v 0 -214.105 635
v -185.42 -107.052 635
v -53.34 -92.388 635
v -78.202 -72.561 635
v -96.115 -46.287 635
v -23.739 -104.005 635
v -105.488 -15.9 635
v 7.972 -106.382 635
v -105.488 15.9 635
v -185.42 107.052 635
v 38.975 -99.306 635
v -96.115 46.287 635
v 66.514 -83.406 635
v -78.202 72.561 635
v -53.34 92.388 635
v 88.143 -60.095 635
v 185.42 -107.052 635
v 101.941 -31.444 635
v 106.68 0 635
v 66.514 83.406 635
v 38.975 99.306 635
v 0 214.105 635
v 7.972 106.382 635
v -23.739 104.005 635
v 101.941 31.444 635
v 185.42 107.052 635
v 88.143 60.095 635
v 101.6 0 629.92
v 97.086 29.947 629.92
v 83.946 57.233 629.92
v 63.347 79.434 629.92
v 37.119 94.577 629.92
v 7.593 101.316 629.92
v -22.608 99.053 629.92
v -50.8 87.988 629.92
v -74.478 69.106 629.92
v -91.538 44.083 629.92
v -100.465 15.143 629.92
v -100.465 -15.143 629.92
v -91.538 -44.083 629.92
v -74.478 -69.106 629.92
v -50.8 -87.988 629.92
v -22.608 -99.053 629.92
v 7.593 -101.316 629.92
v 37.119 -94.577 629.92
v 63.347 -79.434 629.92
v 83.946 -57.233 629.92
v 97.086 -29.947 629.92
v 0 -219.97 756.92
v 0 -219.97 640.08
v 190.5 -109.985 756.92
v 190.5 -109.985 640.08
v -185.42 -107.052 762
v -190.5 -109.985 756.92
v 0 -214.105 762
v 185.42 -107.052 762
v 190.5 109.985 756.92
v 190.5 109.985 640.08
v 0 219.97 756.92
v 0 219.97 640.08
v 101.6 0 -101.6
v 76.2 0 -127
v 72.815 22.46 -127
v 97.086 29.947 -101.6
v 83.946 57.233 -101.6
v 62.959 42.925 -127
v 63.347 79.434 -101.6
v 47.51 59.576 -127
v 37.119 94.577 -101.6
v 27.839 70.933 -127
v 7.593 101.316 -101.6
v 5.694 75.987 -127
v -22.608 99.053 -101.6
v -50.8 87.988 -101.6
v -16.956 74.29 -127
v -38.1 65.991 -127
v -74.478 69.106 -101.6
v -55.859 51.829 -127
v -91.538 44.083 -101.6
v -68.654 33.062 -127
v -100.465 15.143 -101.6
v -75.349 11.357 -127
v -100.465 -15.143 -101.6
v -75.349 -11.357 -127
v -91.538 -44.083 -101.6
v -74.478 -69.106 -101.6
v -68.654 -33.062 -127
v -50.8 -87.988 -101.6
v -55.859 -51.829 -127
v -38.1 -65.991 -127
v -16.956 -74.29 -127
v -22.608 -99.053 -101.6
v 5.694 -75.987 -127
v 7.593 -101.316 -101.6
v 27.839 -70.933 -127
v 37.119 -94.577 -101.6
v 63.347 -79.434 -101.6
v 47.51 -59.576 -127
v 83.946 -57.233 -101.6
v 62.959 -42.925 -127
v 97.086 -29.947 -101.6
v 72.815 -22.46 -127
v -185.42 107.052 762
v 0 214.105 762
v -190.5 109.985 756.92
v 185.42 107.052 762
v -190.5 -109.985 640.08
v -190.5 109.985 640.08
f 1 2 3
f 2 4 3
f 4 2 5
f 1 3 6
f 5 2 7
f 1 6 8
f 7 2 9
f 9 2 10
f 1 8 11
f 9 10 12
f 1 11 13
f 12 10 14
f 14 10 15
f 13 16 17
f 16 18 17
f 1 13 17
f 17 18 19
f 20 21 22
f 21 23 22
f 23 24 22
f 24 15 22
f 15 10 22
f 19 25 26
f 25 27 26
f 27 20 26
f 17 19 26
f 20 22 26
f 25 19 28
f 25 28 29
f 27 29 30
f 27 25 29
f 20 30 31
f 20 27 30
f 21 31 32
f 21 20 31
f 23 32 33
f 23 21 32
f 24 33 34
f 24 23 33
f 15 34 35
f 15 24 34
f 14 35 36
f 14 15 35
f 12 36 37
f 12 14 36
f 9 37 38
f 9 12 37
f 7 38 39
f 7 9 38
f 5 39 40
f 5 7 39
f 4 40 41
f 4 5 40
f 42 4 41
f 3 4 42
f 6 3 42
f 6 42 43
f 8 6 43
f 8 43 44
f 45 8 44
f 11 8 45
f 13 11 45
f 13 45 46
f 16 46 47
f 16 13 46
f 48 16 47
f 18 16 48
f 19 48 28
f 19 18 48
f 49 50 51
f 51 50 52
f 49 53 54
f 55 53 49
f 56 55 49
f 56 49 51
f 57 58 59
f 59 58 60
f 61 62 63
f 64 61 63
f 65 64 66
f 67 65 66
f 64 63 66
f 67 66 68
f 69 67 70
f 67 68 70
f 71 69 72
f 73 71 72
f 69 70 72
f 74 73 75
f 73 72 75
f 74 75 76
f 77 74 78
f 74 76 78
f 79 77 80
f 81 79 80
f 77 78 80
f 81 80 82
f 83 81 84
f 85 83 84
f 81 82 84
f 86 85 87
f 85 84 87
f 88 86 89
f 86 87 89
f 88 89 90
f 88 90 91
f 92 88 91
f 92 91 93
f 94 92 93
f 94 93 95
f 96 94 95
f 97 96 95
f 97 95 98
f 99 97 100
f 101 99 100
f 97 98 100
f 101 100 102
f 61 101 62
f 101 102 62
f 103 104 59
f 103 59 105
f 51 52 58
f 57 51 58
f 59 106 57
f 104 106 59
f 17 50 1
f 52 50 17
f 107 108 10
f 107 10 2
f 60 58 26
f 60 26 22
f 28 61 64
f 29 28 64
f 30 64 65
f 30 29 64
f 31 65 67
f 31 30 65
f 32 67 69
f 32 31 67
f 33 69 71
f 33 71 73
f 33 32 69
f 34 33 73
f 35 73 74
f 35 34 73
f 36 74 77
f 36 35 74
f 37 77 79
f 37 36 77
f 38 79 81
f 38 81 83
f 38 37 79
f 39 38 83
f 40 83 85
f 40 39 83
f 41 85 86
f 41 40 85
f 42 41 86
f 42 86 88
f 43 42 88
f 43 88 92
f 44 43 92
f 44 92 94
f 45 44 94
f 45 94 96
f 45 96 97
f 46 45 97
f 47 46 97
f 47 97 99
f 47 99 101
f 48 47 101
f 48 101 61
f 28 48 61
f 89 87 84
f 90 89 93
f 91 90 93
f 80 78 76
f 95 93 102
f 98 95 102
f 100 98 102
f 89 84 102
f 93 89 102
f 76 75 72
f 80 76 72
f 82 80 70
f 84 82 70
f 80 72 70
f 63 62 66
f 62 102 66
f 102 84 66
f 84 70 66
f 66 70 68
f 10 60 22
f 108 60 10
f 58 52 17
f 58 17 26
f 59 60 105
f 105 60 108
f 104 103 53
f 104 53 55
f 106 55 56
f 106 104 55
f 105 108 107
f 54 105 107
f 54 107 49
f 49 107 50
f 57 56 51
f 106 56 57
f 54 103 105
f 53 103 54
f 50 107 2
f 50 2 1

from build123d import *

# Parameters (mm, degrees)
F0_R     = 101.6
F1_DEPTH = 635
F2_R     = 101.6
F3_DEPTH = 127
F4_DEPTH = 127
F5_SIZE  = 25.4
F6_SIZE  = 5.08


with BuildPart() as f1:
    # F0 (on Top) → F1 (new body)
    with BuildSketch(Plane.XY):
        Circle(F0_R)
    extrude(amount=F1_DEPTH)

    # F2 (on face) → F3 (join)
    with BuildSketch(Plane.XY.offset(635)):
        Polygon((-190.5, 109.9852262806), (-190.5, -109.9852262806), (0, -219.9704525612), (190.5, -109.9852262806), (190.5, 109.9852262806), (0, 219.9704525612), align=None)
        Circle(F2_R, mode=Mode.SUBTRACT)
        Circle(F2_R)
    extrude(amount=F3_DEPTH)

    # F4 (add): a face of the model
    f4_faces = [f1.faces().sort_by_distance(p)[0] for p in [
        (0, 0, 0),
    ]]
    extrude(f4_faces, amount=F4_DEPTH)

    # F5
    f5_edges = [f1.edges().sort_by_distance(p)[0] for p in [
        (-101.6, 0, -127),
    ]]
    chamfer(f5_edges, length=F5_SIZE)

    # F6
    f6_edges = [f1.edges().sort_by_distance(p)[0] for p in [
        (-190.5, 0, 762),
        (-95.25, -164.977839, 762),
        (95.25, -164.977839, 762),
        (190.5, 0, 762),
        (95.25, 164.977839, 762),
        (-95.25, 164.977839, 762),
        (-190.5, 0, 635),
        (-95.25, 164.977839, 635),
        (-95.25, -164.977839, 635),
        (95.25, 164.977839, 635),
        (95.25, -164.977839, 635),
        (190.5, 0, 635),
        (-101.6, 0, 635),
    ]]
    chamfer(f6_edges, length=F6_SIZE)


solid = f1.part
